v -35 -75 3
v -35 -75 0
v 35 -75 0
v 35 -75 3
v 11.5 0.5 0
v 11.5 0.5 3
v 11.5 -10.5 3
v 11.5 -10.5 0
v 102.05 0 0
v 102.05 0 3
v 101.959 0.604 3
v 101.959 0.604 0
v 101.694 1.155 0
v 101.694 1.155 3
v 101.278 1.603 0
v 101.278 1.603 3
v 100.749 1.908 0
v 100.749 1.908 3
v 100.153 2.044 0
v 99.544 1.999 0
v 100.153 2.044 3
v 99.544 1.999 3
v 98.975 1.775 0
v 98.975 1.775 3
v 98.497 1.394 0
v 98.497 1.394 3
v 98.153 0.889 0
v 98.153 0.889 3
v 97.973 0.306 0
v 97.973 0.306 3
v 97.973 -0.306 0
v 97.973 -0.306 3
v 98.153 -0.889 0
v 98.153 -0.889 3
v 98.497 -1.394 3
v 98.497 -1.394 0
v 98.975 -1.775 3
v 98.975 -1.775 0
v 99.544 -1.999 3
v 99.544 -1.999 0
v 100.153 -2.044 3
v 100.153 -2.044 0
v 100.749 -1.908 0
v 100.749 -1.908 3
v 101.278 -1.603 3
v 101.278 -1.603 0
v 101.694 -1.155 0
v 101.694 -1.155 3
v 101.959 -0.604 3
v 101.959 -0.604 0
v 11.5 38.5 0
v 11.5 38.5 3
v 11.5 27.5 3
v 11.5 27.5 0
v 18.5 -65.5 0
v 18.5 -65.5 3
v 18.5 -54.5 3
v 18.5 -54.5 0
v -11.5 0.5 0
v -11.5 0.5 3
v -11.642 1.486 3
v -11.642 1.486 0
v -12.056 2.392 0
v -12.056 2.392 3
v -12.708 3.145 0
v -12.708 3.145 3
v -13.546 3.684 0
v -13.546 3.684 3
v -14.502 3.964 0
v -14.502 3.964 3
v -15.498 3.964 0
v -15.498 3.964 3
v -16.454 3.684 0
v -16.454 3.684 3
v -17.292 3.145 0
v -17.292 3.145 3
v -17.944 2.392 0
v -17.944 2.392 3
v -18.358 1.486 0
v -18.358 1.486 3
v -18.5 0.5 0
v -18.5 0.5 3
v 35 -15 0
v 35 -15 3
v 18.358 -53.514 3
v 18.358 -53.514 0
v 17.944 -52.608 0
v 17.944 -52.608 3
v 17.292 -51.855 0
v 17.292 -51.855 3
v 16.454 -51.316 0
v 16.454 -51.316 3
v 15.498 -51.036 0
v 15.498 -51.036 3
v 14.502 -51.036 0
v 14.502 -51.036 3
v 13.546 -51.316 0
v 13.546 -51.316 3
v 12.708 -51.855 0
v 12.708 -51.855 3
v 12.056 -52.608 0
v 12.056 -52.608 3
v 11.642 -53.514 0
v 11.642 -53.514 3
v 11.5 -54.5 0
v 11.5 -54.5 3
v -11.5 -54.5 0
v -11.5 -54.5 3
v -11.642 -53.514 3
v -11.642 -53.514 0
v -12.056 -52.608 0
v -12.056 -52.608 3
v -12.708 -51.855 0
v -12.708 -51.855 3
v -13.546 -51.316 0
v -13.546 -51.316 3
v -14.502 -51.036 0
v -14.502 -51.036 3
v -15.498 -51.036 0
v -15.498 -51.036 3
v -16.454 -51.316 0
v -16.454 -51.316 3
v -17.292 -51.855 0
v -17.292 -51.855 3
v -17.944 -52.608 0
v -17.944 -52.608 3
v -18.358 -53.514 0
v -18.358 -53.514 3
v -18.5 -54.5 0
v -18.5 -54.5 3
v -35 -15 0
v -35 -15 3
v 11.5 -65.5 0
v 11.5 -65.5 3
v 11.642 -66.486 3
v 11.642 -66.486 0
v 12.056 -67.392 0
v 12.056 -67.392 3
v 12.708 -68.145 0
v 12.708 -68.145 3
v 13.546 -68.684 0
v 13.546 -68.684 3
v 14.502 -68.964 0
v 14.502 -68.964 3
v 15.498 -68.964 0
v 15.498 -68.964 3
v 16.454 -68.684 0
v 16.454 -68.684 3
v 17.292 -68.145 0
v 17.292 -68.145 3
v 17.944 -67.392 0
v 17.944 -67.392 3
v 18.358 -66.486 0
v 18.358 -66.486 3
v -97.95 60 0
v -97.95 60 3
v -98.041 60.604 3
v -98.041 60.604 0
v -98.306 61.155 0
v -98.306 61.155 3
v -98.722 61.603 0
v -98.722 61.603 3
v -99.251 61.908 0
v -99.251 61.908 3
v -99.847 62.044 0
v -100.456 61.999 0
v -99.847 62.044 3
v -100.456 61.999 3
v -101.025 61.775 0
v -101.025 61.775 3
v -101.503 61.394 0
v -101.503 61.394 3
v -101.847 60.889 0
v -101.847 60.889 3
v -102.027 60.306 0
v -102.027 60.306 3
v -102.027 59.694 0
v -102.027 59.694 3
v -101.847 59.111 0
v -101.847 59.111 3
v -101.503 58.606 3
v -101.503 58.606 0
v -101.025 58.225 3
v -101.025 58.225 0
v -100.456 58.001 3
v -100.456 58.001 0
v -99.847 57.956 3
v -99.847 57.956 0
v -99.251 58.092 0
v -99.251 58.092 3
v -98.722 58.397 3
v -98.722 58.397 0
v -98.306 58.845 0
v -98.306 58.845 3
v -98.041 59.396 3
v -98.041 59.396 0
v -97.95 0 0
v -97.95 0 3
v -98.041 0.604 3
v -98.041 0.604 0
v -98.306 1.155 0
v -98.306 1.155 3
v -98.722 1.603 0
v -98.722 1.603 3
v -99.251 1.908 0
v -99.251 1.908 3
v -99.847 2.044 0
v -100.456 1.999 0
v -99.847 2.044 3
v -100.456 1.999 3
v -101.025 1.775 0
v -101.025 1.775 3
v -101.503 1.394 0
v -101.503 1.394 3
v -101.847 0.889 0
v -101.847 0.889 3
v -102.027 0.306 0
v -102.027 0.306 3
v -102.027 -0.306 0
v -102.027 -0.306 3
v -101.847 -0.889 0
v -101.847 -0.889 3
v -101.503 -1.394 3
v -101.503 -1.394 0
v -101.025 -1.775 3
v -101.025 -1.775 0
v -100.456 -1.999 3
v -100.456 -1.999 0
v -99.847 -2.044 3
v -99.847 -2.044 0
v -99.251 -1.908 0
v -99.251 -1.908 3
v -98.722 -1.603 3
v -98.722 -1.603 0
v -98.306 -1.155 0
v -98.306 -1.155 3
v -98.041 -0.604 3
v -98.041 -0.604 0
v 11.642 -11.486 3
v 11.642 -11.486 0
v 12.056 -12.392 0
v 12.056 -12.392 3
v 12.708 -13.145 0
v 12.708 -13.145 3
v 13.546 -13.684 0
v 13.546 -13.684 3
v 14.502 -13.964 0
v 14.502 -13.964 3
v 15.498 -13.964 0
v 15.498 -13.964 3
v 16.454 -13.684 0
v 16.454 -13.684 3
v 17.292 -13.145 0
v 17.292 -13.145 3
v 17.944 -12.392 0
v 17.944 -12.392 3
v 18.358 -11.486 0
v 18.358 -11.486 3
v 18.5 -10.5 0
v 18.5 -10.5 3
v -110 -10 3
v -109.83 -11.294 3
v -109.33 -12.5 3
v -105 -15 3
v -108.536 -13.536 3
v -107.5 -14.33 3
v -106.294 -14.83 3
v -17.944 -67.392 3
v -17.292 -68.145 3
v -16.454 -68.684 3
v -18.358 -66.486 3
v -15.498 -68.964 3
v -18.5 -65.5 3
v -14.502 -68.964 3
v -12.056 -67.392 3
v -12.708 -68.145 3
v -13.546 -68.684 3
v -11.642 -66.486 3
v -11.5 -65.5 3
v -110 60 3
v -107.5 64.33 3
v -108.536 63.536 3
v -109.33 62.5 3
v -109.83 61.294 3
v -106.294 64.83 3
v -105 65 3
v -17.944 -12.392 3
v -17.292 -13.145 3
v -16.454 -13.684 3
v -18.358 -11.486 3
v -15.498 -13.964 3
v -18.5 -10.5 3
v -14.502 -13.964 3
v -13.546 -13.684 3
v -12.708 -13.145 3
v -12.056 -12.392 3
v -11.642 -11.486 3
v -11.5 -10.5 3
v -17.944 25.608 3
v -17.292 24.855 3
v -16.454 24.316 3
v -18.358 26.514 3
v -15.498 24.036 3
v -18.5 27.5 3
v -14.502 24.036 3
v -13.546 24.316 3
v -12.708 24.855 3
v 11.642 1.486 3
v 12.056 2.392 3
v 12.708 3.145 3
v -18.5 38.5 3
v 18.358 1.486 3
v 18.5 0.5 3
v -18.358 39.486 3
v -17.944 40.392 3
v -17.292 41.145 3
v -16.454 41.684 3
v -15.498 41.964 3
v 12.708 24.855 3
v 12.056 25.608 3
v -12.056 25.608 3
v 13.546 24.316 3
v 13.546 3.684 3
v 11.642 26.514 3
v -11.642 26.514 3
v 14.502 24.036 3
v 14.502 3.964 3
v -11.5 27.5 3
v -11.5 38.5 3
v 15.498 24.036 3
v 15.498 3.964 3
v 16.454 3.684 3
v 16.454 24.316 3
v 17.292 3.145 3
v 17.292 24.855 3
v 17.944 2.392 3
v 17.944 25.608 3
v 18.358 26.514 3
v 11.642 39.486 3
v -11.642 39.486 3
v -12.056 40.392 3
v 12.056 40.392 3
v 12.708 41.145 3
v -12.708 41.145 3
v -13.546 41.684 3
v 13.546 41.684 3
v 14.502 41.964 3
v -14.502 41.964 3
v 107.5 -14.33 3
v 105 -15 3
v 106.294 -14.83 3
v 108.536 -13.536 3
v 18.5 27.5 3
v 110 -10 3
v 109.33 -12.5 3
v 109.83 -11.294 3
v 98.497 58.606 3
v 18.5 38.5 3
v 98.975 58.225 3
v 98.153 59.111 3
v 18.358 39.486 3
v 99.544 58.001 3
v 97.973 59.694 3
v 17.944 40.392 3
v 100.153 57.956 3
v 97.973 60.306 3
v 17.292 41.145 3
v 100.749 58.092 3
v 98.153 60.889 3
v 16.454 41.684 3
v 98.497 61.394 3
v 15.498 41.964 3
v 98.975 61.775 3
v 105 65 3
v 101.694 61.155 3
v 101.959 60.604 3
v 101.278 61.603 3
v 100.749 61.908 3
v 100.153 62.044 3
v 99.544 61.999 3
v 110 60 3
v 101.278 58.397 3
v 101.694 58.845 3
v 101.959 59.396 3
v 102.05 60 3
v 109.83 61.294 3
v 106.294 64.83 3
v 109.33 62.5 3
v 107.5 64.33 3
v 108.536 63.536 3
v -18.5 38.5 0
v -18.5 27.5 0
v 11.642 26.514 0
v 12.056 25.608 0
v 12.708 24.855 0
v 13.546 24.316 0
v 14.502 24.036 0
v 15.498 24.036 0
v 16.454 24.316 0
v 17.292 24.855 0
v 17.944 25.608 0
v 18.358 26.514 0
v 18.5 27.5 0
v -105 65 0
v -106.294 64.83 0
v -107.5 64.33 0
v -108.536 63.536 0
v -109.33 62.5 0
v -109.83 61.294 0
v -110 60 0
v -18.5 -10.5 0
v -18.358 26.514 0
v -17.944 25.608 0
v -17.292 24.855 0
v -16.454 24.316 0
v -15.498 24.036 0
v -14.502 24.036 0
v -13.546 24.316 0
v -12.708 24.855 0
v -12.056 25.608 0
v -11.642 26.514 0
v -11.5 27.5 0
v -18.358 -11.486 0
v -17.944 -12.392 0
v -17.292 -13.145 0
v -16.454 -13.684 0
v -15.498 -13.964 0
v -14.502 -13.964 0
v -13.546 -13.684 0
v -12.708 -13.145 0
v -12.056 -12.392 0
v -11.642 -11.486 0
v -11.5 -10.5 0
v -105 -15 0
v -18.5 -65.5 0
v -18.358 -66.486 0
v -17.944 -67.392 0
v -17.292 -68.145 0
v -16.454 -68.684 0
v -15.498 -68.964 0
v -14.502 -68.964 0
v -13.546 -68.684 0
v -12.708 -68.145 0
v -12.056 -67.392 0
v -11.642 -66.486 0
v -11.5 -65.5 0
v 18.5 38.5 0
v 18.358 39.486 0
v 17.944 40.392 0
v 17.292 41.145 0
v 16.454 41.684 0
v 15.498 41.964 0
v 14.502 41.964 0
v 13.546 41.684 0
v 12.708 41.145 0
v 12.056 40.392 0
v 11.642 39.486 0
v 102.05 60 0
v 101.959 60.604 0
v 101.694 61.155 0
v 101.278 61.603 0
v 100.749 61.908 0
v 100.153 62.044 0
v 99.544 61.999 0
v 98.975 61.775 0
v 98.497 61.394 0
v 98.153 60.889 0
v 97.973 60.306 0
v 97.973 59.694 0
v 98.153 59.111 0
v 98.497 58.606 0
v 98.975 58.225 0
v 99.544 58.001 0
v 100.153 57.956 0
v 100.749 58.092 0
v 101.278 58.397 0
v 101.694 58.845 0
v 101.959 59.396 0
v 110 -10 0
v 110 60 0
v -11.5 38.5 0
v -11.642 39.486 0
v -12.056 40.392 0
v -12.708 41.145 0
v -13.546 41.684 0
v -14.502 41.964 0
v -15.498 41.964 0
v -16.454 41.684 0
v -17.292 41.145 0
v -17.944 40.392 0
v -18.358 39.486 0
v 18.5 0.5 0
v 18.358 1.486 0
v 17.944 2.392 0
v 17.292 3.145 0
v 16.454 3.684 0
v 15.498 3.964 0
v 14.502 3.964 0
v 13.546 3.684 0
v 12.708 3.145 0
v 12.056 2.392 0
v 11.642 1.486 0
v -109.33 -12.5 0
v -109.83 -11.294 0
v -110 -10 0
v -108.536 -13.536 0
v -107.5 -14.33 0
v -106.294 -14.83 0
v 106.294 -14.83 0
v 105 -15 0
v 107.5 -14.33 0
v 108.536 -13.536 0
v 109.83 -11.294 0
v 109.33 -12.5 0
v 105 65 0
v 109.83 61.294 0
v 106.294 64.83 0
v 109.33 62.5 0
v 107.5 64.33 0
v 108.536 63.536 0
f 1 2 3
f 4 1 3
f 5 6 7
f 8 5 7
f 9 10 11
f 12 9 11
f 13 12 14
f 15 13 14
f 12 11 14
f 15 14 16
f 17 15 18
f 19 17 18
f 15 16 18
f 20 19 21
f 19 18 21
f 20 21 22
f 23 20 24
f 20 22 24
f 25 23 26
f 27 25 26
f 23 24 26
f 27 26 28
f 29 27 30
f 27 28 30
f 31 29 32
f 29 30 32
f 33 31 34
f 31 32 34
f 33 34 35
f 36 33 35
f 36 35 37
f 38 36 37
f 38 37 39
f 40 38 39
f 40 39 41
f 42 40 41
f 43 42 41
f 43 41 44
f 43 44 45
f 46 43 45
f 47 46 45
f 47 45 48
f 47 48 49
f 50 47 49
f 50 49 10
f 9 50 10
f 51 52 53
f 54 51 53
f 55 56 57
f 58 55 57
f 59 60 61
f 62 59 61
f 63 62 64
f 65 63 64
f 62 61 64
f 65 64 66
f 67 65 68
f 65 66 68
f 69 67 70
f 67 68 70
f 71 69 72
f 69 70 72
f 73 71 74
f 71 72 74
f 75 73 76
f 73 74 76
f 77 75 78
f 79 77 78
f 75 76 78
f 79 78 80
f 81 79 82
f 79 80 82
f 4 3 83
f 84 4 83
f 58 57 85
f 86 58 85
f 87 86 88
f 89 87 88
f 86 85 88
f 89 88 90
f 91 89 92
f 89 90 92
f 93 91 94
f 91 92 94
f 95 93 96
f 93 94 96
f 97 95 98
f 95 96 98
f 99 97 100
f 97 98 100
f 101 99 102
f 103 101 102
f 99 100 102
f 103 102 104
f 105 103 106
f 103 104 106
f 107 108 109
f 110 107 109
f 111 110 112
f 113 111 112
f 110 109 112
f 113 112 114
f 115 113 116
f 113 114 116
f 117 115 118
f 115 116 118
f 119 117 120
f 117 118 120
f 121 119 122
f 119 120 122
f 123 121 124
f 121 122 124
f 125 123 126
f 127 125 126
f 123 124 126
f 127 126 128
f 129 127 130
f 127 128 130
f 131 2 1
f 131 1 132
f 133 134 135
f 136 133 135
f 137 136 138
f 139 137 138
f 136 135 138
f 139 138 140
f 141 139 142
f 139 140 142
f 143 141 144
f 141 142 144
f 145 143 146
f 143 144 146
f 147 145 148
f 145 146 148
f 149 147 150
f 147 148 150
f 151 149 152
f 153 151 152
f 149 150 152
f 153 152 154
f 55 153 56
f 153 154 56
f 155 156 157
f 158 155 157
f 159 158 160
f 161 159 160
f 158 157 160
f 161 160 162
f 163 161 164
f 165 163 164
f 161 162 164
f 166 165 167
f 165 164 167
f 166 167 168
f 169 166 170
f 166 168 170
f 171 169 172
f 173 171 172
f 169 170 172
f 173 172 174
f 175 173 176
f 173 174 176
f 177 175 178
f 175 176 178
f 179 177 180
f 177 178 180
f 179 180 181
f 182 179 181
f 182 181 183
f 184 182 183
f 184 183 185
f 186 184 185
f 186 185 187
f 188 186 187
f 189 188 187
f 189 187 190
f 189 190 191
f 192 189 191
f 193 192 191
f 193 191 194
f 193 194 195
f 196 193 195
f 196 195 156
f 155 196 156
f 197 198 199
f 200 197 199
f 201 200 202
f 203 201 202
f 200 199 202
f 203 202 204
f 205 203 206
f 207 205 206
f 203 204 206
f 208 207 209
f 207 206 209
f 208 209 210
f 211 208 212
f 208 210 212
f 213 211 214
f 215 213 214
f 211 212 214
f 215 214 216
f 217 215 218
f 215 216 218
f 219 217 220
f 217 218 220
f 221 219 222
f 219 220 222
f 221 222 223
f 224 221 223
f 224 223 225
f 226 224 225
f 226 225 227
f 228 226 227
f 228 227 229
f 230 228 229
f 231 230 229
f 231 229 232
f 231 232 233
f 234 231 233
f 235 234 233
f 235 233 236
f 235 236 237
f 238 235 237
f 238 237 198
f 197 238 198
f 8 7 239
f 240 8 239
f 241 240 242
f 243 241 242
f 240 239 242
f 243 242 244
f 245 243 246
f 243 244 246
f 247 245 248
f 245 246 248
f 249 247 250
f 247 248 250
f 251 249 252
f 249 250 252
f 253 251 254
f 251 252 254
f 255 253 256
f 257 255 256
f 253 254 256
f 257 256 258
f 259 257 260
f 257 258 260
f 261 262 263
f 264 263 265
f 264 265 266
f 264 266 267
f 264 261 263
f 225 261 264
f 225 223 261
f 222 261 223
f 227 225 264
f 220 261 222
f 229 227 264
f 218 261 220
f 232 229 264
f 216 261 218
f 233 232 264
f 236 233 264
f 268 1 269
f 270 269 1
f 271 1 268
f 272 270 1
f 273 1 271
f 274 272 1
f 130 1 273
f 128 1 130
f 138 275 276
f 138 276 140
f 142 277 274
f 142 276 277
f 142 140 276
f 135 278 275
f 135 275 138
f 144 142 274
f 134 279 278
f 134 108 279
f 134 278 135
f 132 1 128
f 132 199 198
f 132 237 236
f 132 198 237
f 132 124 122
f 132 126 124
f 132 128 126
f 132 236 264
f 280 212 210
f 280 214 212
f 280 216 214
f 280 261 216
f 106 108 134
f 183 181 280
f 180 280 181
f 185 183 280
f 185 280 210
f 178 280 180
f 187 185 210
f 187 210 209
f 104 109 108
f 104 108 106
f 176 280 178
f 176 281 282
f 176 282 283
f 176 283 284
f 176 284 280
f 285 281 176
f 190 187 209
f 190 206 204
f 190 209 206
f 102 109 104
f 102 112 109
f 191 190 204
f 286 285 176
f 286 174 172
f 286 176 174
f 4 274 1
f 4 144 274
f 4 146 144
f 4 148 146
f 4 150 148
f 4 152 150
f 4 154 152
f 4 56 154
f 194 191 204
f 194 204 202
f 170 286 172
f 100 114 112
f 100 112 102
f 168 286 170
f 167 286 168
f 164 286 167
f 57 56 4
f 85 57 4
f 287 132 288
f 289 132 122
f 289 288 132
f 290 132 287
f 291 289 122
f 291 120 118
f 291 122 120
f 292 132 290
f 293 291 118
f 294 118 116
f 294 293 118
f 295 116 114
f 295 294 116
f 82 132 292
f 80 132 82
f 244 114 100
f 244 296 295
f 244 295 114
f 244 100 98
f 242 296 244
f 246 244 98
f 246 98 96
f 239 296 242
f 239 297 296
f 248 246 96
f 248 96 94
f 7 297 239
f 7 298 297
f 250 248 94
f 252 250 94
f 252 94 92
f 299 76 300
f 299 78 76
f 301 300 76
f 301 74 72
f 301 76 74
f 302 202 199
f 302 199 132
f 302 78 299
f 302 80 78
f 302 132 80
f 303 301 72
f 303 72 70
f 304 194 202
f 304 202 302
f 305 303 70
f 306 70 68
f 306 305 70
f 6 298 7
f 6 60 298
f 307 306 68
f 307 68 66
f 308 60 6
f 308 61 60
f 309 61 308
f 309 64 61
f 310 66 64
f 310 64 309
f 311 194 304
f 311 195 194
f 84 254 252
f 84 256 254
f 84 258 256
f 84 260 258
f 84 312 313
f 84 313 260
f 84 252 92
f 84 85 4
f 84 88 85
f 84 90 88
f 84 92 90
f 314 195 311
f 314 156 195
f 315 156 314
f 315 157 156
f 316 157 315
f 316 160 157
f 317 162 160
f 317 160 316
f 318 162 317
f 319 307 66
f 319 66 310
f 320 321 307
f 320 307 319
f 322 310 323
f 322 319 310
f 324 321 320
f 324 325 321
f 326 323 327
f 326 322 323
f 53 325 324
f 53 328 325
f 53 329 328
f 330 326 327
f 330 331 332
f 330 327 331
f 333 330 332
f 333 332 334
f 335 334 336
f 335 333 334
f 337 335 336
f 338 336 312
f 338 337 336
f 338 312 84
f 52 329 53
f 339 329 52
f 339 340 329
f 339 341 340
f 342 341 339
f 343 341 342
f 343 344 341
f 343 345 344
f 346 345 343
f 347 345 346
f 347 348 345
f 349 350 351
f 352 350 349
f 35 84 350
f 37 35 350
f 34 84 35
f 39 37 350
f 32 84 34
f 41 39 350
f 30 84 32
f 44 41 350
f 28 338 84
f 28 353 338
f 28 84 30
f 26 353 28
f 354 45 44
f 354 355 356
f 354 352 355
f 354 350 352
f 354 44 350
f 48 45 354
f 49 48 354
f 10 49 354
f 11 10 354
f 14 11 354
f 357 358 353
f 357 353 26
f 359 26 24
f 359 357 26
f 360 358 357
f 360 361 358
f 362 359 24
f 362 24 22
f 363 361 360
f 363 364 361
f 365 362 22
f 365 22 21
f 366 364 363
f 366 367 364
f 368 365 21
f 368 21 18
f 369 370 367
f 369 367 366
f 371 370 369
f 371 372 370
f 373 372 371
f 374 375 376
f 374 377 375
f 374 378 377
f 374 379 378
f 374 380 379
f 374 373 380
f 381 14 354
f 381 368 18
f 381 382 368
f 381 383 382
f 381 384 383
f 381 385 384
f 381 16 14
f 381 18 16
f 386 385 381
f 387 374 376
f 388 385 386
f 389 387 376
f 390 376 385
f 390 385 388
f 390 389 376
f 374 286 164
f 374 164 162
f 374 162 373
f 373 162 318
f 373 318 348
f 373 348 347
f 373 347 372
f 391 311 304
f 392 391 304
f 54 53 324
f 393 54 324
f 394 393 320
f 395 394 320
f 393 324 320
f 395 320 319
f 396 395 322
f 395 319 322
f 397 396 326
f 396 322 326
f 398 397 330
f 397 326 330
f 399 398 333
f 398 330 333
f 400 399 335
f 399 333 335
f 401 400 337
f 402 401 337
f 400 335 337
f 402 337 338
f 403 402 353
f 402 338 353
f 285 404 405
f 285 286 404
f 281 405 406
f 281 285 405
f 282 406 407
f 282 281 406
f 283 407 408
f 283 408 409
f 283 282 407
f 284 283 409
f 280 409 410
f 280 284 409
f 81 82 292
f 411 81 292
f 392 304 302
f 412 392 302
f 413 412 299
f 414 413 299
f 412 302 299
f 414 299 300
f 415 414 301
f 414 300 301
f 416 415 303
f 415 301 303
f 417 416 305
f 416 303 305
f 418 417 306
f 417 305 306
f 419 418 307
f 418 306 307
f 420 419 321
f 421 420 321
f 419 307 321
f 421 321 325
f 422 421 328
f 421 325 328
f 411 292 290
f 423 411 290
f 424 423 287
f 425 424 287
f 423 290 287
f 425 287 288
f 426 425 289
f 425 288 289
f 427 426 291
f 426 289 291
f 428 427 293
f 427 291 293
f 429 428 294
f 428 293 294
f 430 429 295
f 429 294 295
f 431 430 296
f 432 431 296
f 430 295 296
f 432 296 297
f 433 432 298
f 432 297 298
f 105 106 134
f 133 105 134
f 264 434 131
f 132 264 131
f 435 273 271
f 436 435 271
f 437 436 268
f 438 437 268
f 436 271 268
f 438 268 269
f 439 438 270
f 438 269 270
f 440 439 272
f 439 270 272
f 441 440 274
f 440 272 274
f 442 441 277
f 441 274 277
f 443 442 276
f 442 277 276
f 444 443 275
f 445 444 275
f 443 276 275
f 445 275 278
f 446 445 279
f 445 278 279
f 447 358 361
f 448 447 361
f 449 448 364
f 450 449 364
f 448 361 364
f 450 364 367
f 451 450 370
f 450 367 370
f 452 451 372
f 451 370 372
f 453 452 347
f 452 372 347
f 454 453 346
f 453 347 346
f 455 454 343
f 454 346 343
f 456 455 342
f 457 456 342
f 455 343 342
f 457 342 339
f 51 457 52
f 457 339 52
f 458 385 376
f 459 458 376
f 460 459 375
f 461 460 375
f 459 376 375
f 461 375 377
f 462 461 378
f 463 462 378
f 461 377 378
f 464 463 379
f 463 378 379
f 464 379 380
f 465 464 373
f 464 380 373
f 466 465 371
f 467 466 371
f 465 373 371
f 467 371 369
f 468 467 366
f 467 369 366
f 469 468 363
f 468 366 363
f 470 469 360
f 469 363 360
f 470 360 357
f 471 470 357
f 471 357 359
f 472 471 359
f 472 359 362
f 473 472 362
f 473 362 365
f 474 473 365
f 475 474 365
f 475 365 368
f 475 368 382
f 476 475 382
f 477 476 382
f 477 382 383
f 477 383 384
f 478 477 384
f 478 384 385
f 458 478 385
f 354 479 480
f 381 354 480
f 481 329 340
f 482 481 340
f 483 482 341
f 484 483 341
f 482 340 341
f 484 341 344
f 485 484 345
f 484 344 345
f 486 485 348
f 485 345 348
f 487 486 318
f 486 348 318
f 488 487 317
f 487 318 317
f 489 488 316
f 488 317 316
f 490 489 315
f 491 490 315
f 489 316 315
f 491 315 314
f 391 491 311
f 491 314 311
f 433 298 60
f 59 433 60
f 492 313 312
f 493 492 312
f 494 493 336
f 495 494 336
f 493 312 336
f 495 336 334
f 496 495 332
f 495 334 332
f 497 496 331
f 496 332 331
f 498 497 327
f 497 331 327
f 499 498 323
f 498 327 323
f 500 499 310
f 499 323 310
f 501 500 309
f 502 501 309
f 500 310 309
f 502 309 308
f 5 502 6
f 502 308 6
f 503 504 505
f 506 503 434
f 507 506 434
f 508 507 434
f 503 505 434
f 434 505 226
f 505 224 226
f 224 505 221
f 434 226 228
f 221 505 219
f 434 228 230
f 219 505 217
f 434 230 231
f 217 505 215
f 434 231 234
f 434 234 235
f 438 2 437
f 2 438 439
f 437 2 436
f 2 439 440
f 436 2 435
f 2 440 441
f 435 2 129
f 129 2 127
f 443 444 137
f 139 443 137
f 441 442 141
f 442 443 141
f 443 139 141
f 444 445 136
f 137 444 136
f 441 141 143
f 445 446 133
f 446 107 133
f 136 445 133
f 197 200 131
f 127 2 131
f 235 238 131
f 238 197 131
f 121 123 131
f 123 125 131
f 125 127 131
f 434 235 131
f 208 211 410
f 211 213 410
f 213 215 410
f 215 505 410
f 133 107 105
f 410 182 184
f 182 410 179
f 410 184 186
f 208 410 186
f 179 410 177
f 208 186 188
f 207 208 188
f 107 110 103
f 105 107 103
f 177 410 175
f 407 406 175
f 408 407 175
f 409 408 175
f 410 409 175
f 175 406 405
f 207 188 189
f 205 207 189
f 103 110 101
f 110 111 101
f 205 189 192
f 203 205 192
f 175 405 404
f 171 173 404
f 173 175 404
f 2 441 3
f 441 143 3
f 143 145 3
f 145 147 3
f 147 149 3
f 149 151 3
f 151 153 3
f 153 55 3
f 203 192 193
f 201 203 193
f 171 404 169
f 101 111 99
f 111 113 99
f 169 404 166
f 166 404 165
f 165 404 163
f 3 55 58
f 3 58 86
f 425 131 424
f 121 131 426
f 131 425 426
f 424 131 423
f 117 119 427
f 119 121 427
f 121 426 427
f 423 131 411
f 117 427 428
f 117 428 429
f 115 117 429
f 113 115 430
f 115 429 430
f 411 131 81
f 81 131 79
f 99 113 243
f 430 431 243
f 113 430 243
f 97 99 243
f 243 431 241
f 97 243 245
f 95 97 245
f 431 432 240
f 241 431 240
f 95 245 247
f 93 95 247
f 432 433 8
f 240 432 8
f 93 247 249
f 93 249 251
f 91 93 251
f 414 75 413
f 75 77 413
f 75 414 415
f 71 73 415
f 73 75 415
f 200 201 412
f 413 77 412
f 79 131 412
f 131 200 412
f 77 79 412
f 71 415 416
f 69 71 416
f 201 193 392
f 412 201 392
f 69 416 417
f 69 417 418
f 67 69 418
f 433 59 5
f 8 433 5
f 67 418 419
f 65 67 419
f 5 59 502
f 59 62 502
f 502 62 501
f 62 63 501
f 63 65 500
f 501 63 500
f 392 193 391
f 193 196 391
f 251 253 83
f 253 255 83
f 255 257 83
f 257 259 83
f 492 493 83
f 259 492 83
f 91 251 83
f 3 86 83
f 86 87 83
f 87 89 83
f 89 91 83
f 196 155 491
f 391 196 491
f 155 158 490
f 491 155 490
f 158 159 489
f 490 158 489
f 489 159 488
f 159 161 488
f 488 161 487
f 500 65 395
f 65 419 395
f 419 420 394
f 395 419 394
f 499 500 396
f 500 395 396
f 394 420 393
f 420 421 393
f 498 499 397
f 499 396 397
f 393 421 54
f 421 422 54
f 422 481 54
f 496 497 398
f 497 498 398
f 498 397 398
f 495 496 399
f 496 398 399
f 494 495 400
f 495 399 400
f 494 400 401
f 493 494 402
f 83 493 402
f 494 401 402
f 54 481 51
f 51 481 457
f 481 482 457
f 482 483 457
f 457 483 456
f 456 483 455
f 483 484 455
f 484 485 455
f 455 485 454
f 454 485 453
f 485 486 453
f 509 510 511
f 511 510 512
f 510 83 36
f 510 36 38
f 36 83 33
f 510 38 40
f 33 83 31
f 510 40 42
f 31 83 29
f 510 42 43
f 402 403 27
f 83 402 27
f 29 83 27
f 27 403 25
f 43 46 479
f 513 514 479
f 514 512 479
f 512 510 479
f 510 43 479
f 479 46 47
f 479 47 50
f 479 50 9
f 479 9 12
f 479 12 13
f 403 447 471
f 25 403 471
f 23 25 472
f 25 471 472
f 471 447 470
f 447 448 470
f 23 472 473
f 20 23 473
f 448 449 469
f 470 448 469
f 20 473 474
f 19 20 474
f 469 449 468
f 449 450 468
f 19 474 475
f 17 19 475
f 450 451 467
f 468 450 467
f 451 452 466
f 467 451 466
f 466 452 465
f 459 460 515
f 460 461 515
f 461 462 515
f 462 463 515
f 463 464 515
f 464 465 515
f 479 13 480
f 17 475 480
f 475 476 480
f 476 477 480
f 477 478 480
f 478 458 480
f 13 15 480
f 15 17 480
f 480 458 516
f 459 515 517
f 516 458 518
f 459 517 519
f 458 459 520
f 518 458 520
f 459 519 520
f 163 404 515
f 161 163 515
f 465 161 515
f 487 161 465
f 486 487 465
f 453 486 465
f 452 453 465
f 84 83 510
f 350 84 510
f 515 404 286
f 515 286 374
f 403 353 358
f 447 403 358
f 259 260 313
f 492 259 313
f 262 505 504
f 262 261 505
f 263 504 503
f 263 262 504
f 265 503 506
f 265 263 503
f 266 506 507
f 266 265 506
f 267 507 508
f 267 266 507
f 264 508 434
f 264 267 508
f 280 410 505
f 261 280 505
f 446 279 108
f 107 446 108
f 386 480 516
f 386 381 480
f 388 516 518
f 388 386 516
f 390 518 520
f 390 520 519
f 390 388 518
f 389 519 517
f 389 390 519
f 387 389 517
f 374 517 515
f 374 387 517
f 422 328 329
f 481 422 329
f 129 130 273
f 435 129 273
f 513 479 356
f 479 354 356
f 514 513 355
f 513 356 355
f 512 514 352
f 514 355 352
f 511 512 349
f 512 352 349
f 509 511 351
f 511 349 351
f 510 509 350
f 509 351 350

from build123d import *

# Parameters (mm, degrees)
F0_W     = 70
F0_H     = 60
F0_W_2   = 220
F0_H_2   = 50
F1_DEPTH = 3
F2_R     = 2.05
F3_DEPTH = 25
F4_R     = 5


# Not quite as in the source:
# - a feature names something its author has since deleted; it is built from what else it names


with BuildPart() as f1:
    # F0 (on Top) → F1 (new body)
    with BuildSketch(Plane.XY):
        Polygon((35, -15), (110, -15), (110, 15), (-110, 15), (-110, -15), (-35, -15), align=None)
        with Locations((0, -45)):
            Rectangle(F0_W, F0_H)
        with Locations((0, 40)):
            Rectangle(F0_W_2, F0_H_2)
    extrude(amount=F1_DEPTH)

    # F2 (on face) → F3 (cut)
    with BuildSketch(Plane.XY.offset(3)):
        with Locations((-100, 0)):
            Circle(F2_R)
        with Locations((100, 0)):
            Circle(F2_R)
        with BuildLine():
            ThreePointArc((-18.5, 27.5), (-15, 24), (-11.5, 27.5))
            Line((-11.5, 27.5), (-11.5, 38.5))
            ThreePointArc((-11.5, 38.5), (-15, 42), (-18.5, 38.5))
            Line((-18.5, 38.5), (-18.5, 27.5))
        make_face()
        with BuildLine():
            ThreePointArc((11.5, 27.5), (15, 24), (18.5, 27.5))
            Line((18.5, 27.5), (18.5, 38.5))
            ThreePointArc((18.5, 38.5), (15, 42), (11.5, 38.5))
            Line((11.5, 38.5), (11.5, 27.5))
        make_face()
        with BuildLine():
            ThreePointArc((-18.5, -65.5), (-15, -69), (-11.5, -65.5))
            Line((-11.5, -65.5), (-11.5, -54.5))
            ThreePointArc((-11.5, -54.5), (-15, -51), (-18.5, -54.5))
            Line((-18.5, -54.5), (-18.5, -65.5))
        make_face()
        with BuildLine():
            ThreePointArc((11.5, -65.5), (15, -69), (18.5, -65.5))
            Line((18.5, -65.5), (18.5, -54.5))
            ThreePointArc((18.5, -54.5), (15, -51), (11.5, -54.5))
            Line((11.5, -54.5), (11.5, -65.5))
        make_face()
        with Locations((-100, 60)):
            Circle(F2_R)
        with Locations((100, 60)):
            Circle(F2_R)
        with BuildLine():
            ThreePointArc((-18.5, -10.5), (-15, -14), (-11.5, -10.5))
            Line((-11.5, -10.5), (-11.5, 0.5))
            ThreePointArc((-11.5, 0.5), (-15, 4), (-18.5, 0.5))
            Line((-18.5, 0.5), (-18.5, -10.5))
        make_face()
        with BuildLine():
            ThreePointArc((11.5, -10.5), (15, -14), (18.5, -10.5))
            Line((18.5, -10.5), (18.5, 0.5))
            ThreePointArc((18.5, 0.5), (15, 4), (11.5, 0.5))
            Line((11.5, 0.5), (11.5, -10.5))
        make_face()
    extrude(amount=-F3_DEPTH, mode=Mode.SUBTRACT)

    # F4
    f4_edges = [f1.edges().sort_by_distance(p)[0] for p in [
        (-110, -15, 1.5),
        (110, -15, 1.5),
        (110, 65, 1.5),
        (-110, 65, 1.5),
    ]]
    fillet(f4_edges, radius=F4_R)


solid = f1.part
